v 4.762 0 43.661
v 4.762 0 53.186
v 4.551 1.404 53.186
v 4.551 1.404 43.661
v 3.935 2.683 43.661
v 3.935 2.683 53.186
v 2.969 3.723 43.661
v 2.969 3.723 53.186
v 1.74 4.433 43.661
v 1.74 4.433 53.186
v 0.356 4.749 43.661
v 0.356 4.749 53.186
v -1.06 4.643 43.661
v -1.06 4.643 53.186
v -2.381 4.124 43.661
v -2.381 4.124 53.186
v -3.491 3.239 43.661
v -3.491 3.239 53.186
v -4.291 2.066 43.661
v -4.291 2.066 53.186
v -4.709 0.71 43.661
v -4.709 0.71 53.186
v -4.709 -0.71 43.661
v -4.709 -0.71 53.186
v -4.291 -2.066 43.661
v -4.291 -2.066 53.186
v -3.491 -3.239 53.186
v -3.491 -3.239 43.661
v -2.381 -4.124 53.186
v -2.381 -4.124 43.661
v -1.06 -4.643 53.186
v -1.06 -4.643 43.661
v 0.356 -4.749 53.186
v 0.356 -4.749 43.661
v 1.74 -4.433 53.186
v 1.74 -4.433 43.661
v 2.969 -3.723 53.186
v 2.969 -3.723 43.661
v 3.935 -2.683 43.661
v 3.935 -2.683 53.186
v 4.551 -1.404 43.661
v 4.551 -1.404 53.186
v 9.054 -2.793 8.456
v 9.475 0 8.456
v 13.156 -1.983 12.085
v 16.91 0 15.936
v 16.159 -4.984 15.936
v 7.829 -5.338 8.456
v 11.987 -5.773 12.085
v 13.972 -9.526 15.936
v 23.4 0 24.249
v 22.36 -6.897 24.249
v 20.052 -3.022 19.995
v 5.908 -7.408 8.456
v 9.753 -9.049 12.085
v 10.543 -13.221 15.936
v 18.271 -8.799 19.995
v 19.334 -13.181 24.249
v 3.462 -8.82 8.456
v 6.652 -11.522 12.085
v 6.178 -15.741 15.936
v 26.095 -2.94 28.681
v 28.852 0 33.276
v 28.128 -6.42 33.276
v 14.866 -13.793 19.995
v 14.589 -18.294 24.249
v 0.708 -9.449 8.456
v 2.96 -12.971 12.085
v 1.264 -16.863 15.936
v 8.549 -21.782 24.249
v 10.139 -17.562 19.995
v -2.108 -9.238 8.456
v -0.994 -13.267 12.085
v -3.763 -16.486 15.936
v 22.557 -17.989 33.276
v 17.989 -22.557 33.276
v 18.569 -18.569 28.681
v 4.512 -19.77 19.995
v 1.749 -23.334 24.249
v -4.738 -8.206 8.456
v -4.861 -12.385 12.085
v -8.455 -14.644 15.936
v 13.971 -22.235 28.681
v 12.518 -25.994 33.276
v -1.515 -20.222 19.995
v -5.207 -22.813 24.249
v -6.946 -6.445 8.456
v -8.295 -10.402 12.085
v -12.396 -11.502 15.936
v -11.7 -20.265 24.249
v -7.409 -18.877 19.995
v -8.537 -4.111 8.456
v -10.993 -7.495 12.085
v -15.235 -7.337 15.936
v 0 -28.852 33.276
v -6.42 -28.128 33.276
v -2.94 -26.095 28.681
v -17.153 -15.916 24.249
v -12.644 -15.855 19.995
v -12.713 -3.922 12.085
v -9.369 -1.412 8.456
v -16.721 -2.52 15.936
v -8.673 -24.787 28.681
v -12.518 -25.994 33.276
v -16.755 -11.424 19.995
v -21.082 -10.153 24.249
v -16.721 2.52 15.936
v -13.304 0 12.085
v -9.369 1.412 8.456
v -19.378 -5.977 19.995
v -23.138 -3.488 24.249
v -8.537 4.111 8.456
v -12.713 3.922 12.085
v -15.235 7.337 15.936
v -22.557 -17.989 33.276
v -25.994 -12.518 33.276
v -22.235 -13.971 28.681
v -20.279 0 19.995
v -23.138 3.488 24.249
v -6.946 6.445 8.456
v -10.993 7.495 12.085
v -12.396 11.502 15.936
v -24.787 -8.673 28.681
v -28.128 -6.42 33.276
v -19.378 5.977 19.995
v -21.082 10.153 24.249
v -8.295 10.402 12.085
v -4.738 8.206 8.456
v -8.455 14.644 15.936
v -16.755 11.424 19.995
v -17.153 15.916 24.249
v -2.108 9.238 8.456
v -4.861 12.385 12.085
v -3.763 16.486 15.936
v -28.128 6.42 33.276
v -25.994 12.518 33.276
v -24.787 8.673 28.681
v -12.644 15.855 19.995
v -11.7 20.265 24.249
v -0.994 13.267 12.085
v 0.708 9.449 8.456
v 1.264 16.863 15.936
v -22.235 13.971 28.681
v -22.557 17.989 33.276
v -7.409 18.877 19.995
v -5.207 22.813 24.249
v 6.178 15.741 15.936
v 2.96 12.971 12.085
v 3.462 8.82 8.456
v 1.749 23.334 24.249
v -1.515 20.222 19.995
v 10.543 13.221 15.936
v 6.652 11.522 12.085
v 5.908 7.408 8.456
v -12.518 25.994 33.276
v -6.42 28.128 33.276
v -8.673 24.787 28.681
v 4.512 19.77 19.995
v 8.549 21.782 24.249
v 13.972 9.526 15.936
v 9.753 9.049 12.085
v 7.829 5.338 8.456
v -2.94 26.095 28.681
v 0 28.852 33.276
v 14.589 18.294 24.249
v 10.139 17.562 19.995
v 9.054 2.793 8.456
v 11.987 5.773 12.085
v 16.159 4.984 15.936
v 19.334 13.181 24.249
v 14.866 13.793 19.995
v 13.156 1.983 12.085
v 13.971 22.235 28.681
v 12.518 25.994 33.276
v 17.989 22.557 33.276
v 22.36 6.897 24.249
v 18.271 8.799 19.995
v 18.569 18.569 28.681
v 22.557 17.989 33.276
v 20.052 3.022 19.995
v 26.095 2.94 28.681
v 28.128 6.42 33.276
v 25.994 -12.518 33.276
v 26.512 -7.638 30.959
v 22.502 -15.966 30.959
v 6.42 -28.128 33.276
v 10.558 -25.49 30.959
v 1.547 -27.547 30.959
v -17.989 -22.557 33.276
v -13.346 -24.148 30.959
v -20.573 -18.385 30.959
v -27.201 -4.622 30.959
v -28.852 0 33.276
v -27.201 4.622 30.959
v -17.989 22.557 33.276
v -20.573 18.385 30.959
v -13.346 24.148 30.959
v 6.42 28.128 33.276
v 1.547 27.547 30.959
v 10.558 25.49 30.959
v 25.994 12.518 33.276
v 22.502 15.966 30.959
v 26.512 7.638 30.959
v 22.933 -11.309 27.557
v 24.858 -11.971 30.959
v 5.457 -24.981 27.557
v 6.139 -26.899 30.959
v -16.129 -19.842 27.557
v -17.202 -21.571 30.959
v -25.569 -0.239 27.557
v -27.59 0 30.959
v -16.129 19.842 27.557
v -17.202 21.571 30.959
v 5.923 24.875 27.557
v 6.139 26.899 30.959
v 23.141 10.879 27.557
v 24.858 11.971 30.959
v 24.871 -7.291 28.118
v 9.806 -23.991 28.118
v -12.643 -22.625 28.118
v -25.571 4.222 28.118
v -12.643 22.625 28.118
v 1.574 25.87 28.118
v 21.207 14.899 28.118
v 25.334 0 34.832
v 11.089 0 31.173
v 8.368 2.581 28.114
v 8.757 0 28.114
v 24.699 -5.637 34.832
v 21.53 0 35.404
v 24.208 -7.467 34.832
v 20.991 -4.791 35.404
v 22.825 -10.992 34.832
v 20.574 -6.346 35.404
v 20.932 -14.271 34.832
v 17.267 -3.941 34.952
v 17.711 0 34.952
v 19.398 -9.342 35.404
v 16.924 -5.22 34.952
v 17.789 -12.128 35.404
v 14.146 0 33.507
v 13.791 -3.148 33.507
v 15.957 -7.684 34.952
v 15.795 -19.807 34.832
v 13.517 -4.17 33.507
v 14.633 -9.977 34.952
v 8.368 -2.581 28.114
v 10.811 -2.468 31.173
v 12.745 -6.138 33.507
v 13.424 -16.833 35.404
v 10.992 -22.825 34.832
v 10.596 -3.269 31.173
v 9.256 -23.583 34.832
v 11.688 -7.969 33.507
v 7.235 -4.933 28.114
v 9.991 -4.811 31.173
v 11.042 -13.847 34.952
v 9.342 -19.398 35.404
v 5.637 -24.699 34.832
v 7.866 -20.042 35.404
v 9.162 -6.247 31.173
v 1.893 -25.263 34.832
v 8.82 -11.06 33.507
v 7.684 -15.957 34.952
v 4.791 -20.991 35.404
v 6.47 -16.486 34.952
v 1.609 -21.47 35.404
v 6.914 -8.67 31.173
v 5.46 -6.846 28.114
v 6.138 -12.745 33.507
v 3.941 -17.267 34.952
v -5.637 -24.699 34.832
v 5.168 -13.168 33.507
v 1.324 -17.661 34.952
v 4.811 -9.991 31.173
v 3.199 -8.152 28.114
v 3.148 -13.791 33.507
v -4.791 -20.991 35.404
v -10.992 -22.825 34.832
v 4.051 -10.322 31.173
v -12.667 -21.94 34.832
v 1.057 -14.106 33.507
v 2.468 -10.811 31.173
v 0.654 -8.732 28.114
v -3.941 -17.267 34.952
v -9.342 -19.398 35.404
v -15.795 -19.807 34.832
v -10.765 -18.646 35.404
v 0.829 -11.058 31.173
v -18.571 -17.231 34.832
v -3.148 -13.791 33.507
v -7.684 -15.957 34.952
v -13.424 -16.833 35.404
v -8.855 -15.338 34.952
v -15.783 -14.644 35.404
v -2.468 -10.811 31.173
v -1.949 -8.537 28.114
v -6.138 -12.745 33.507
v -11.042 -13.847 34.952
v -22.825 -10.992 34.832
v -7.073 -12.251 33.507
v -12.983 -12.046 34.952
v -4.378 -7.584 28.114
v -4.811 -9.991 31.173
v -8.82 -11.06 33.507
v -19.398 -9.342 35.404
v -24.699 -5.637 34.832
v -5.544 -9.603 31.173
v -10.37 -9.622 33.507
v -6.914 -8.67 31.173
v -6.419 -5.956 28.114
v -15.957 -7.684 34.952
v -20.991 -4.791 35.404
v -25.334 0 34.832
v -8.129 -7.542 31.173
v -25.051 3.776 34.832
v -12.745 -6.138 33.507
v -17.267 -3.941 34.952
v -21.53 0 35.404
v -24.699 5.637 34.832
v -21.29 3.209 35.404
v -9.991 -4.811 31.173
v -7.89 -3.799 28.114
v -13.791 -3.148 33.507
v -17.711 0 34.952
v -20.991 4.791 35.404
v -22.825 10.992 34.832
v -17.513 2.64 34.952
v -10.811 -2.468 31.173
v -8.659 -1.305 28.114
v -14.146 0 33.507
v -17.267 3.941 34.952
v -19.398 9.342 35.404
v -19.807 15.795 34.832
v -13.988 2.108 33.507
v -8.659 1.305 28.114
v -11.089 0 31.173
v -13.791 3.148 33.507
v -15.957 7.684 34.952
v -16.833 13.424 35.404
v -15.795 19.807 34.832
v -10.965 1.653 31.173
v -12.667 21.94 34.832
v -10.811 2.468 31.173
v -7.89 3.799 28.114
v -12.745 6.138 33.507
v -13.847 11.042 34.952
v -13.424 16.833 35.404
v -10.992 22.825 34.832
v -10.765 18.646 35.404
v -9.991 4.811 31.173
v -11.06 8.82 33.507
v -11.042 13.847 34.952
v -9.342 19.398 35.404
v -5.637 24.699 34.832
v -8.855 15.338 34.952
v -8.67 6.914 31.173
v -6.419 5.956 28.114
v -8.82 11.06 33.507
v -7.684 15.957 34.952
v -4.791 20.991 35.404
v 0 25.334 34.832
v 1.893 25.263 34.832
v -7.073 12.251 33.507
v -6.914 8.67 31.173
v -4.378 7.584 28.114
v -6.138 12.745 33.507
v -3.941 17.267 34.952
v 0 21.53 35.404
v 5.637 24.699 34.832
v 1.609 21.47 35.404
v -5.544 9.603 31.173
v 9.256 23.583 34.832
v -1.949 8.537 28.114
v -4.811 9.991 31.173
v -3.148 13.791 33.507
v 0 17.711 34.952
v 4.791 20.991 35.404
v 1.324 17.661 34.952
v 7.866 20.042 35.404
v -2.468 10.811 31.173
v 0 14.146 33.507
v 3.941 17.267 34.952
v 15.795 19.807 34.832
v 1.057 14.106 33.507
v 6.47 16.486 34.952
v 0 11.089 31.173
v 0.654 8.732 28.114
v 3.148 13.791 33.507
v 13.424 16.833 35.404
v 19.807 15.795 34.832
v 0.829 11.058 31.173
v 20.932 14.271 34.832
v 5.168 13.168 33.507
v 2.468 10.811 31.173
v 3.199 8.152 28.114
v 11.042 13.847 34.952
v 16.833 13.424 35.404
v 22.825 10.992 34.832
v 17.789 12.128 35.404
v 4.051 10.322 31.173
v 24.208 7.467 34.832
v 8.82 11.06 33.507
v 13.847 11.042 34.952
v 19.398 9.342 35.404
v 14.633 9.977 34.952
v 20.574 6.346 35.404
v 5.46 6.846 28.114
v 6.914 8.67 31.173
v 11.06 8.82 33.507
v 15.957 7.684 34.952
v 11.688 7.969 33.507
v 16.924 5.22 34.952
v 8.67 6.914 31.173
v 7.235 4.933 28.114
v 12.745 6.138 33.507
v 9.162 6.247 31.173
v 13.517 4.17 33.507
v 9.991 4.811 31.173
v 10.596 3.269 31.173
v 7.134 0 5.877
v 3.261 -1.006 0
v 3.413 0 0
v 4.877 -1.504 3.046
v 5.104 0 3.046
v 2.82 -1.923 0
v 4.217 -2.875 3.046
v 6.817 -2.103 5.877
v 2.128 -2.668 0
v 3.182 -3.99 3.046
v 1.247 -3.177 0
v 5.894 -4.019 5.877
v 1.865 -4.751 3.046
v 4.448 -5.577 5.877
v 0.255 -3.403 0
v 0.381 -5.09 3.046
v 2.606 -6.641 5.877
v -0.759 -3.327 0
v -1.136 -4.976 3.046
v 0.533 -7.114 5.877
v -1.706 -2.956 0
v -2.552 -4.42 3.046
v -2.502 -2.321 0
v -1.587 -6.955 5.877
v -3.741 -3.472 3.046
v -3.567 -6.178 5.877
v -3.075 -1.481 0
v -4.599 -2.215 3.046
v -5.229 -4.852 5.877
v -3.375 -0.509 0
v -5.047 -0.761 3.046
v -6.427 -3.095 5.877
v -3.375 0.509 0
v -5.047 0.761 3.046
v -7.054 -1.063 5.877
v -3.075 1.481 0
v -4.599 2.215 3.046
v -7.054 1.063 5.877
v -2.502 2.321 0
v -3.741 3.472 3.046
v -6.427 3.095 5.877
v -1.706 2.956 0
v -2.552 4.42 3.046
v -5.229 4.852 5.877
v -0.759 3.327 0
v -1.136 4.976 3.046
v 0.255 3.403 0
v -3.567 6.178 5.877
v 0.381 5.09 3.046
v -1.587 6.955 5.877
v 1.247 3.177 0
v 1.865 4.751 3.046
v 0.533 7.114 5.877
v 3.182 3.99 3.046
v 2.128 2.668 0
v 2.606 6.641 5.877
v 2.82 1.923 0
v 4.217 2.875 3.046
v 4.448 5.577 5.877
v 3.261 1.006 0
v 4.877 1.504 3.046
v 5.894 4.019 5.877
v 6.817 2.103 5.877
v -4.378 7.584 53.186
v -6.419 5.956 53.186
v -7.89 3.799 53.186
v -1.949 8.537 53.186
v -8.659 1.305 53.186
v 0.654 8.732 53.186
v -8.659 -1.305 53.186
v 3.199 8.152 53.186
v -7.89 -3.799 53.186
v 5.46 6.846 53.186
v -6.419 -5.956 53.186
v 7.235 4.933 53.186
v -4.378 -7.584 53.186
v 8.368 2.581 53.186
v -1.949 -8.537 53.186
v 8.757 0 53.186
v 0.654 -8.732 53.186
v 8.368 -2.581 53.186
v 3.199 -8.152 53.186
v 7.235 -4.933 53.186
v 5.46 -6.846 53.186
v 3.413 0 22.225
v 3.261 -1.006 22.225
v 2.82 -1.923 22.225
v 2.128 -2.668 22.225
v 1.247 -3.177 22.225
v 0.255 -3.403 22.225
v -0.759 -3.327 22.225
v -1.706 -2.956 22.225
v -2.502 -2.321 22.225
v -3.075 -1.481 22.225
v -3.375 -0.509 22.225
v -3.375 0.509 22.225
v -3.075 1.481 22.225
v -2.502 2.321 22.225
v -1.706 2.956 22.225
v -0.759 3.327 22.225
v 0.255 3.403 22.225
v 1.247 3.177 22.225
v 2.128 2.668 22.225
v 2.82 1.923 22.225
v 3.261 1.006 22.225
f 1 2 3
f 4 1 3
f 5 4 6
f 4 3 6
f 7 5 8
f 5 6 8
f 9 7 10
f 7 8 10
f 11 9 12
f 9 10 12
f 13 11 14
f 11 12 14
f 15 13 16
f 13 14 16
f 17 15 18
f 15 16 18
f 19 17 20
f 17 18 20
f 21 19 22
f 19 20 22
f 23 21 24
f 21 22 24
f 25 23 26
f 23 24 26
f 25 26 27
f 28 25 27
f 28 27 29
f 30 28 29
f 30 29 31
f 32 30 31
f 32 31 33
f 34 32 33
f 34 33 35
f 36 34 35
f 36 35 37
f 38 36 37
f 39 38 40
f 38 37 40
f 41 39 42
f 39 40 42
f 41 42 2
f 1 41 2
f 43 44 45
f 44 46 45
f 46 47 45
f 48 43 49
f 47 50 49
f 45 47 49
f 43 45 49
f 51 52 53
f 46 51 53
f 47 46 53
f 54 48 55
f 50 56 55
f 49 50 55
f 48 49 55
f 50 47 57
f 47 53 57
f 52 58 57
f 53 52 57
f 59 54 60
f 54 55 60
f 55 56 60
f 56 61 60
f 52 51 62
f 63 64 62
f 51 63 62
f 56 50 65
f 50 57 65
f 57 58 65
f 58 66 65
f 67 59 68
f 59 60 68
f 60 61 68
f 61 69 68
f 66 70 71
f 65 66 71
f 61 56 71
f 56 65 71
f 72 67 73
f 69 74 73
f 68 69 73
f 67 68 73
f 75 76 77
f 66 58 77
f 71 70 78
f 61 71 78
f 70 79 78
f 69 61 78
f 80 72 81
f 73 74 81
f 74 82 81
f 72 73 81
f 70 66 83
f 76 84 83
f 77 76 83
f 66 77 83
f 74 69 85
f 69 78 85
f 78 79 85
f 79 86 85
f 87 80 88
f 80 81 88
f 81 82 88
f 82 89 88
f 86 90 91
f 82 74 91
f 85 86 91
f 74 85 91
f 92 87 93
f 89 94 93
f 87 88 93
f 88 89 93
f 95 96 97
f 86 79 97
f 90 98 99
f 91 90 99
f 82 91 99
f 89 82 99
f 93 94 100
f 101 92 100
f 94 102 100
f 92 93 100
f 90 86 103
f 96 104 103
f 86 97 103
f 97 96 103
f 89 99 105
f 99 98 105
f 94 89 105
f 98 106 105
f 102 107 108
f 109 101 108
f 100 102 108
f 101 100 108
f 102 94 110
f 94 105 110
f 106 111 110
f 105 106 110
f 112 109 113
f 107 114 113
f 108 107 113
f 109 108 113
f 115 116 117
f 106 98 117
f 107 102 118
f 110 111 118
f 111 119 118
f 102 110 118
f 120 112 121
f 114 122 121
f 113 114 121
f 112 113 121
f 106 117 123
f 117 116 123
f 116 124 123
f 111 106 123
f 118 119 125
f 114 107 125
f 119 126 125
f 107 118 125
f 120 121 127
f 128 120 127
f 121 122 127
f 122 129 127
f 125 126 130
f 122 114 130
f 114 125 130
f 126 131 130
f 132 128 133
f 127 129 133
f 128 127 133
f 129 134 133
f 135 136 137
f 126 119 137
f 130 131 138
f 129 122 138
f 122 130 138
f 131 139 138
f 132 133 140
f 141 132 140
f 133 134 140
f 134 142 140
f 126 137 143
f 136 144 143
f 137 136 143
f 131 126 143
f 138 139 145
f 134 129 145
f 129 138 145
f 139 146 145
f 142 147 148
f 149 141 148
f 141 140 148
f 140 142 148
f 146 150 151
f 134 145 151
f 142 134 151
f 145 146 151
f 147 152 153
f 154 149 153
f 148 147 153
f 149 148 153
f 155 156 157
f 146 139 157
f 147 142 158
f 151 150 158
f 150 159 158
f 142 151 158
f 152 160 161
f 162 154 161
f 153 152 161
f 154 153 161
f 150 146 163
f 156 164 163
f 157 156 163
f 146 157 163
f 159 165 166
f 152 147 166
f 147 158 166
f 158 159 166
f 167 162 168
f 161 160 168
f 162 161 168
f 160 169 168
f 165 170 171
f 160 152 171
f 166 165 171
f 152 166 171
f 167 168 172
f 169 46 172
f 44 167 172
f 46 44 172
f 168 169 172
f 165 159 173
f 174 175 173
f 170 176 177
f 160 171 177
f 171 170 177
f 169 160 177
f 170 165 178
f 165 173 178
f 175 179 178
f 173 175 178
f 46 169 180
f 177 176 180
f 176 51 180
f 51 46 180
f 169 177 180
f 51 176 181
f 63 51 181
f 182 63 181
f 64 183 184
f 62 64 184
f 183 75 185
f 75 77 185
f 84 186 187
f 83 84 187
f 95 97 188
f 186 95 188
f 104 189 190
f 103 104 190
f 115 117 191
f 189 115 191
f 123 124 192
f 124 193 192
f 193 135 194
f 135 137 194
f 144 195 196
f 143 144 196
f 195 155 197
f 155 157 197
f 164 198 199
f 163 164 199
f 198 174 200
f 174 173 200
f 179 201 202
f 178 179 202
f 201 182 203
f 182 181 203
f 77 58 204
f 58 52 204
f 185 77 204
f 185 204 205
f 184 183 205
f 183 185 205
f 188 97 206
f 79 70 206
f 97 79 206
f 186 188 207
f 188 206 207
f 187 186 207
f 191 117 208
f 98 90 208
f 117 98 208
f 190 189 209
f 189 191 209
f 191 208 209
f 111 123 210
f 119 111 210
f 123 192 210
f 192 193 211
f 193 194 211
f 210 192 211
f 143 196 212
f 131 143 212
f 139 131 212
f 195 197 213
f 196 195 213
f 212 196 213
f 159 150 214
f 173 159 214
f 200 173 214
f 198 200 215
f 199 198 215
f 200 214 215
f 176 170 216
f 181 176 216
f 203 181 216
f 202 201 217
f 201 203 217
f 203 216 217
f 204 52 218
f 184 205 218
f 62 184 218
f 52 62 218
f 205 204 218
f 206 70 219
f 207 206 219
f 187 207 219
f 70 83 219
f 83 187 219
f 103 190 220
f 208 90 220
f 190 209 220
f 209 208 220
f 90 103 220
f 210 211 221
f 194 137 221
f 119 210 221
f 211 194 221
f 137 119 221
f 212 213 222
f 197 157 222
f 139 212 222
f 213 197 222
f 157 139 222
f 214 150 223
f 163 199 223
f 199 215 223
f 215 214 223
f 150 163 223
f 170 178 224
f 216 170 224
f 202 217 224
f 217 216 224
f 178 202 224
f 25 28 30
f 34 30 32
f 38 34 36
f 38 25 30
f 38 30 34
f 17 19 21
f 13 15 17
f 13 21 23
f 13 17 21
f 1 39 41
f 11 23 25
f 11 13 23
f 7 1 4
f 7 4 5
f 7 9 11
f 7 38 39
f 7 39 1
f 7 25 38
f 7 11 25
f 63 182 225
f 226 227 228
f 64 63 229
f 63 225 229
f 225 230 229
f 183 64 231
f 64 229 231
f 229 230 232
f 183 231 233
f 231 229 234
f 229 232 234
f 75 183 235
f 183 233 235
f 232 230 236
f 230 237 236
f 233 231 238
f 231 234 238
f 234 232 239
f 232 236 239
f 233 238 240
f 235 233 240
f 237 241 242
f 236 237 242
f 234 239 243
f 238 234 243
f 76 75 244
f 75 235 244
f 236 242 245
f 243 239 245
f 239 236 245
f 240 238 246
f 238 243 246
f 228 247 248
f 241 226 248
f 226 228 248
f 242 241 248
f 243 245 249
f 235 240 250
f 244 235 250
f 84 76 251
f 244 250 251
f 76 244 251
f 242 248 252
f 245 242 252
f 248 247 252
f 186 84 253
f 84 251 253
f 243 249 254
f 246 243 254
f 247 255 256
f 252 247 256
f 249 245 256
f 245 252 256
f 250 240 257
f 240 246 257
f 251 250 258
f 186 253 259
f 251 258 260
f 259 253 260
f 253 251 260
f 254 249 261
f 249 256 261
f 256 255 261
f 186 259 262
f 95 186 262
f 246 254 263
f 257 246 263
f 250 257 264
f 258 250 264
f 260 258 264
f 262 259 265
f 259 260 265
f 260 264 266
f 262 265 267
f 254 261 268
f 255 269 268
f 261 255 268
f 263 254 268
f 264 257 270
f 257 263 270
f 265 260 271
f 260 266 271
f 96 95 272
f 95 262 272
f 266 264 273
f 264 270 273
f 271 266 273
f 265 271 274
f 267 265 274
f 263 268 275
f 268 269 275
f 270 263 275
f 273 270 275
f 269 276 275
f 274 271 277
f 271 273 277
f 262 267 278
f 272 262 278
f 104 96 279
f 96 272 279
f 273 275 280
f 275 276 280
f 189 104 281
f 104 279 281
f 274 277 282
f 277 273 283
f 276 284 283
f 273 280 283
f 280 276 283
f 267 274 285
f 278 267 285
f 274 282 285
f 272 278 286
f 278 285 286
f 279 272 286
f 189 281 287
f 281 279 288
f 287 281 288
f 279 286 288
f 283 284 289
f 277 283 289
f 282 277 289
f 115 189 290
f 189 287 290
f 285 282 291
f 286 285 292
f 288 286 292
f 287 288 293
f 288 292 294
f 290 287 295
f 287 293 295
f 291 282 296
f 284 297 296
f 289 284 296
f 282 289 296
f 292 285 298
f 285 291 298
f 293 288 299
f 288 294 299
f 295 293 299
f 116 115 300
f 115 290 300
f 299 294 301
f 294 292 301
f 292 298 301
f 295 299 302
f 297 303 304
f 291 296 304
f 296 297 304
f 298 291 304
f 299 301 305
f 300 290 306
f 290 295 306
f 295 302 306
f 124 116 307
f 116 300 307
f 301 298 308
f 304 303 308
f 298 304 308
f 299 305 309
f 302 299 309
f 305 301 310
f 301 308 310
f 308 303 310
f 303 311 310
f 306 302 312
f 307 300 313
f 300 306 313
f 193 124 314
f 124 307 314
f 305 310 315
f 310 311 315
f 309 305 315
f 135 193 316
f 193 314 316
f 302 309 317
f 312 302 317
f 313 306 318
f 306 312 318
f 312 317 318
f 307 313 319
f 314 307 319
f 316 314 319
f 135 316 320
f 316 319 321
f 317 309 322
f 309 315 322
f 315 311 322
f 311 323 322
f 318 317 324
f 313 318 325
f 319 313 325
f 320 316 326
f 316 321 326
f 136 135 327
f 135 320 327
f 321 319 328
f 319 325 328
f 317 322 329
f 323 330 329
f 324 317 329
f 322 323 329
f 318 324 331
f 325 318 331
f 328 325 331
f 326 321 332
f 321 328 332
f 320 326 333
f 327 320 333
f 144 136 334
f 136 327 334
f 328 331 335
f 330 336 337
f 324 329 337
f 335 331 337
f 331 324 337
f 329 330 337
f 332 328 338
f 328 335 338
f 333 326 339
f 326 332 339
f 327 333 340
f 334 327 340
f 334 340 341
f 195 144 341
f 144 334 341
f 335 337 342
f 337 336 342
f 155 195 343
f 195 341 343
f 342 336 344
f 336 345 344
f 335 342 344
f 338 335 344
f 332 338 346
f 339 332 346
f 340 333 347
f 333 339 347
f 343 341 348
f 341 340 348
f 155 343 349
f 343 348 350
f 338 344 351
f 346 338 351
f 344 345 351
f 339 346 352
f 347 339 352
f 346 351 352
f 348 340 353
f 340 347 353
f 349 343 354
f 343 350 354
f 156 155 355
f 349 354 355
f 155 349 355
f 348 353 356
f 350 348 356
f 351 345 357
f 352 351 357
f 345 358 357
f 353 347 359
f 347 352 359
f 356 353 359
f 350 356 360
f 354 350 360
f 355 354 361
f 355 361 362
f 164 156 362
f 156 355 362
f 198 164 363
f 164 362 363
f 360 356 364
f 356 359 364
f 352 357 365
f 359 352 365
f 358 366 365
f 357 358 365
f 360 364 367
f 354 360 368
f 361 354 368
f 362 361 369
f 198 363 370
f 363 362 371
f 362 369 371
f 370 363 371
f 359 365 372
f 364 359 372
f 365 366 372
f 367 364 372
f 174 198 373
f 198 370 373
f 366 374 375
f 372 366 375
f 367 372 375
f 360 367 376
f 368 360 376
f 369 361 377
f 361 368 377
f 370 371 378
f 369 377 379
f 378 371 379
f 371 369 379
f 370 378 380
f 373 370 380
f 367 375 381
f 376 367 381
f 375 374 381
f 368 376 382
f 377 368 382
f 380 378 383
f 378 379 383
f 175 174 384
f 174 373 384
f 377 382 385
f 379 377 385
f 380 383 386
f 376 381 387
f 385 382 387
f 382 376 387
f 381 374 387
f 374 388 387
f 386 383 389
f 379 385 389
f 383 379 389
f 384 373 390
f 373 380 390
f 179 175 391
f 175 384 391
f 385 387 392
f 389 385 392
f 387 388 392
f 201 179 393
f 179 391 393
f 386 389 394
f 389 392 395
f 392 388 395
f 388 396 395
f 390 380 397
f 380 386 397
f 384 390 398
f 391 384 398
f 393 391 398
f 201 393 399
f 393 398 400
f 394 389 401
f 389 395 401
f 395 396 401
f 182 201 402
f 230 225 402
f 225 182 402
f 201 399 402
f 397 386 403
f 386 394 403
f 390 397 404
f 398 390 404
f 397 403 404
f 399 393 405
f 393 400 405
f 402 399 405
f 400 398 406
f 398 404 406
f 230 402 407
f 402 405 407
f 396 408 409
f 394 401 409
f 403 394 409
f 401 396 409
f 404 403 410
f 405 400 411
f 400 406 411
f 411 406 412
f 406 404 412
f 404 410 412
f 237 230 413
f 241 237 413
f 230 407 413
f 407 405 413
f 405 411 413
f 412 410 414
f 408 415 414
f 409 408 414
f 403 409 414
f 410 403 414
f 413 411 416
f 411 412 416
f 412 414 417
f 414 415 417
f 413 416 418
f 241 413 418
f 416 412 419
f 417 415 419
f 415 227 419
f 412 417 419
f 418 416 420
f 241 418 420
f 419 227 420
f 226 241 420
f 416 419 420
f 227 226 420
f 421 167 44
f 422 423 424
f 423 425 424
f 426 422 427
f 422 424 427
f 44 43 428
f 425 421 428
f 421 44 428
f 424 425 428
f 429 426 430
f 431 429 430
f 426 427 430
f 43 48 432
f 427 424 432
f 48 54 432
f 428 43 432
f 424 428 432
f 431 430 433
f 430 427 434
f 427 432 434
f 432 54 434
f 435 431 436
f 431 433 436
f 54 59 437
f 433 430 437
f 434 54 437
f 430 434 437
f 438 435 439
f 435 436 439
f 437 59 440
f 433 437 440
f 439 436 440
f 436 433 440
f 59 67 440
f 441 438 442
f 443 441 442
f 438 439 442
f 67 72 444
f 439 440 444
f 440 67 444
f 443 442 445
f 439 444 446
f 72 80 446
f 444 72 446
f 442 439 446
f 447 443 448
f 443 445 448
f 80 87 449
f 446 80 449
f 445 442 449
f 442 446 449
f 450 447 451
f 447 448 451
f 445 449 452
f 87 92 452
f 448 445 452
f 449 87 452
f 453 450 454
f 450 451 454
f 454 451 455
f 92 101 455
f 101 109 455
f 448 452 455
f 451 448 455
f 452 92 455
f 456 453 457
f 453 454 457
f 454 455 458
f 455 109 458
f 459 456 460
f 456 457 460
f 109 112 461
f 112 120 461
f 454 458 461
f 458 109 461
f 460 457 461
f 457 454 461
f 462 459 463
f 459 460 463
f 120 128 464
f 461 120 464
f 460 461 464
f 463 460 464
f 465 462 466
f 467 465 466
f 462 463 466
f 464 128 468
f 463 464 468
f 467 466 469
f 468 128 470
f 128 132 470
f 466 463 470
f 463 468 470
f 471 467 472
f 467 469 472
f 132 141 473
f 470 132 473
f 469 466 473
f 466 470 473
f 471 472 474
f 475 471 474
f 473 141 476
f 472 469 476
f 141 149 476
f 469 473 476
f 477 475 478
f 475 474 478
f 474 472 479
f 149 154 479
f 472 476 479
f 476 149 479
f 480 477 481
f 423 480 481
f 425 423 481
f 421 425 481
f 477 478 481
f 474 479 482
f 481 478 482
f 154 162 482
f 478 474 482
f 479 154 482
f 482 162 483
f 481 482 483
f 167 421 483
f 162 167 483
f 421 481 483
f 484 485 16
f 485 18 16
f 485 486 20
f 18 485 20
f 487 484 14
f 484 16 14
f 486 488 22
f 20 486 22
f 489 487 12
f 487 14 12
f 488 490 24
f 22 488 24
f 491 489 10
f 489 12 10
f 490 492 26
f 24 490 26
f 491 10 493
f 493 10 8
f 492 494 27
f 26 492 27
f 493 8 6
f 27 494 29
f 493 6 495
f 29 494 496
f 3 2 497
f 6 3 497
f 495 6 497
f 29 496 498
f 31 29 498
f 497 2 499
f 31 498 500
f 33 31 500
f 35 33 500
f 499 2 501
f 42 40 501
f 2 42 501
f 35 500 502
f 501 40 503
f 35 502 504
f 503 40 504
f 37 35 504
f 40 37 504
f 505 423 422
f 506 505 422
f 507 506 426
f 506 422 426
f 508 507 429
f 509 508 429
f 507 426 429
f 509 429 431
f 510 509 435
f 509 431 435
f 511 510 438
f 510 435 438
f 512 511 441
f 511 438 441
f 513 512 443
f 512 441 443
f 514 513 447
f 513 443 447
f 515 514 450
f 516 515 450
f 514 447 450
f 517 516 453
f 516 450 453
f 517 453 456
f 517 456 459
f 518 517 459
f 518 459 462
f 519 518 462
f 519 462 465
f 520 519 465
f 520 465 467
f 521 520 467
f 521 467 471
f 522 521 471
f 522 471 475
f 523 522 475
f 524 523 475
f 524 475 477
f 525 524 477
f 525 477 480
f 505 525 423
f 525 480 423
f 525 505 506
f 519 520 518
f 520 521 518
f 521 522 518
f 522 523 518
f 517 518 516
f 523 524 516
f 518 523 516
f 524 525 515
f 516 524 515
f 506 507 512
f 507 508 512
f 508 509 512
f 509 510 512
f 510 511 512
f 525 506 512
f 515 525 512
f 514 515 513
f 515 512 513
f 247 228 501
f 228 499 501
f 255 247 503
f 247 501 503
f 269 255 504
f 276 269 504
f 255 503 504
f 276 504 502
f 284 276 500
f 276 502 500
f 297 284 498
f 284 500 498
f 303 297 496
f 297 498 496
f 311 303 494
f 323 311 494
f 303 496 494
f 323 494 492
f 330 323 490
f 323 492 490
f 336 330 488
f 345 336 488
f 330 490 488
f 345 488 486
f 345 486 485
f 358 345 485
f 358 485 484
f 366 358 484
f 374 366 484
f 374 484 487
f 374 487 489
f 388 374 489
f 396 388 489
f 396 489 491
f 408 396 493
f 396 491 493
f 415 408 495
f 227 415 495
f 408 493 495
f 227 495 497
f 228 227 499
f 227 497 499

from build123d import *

# Parameters (mm, degrees)
F3_DEPTH = 22.225
F2_R     = 4.7625
F4_DEPTH = 9.525


with BuildPart() as f1:
    # F0 (on Front) → F1 (revolve)
    with BuildSketch(Plane.XZ):
        with BuildLine():
            ThreePointArc((3.412974067, 0), (6.0780676214, 4.490586962), (9.4752153529, 8.4563759387))
            ThreePointArc((9.4752153529, 8.4563759387), (20.2789307242, 19.9953148359), (28.8515333086, 33.2760475576))
            ThreePointArc((28.8515333086, 33.2760475576), (17.7106806745, 34.9519719001), (8.7568536401, 28.1141139567))
            Line((8.7568536401, 28.1141139567), (8.7568536401, 53.1863681972))
            Line((8.7568536401, 53.1863681972), (0, 53.1863681972))
            Line((0, 53.1863681972), (0, 0))
            Line((0, 0), (3.412974067, 0))
        make_face()
    revolve(axis=Axis((0, 0, 26.5931840986), (0, 0, -1)))

    # F3 (cut): a face of the model
    f3_faces = [f1.faces().sort_by_distance(p)[0] for p in [
        (0, 0, 0),
    ]]
    extrude(f3_faces, amount=-F3_DEPTH, mode=Mode.SUBTRACT)

    # F2 (on face) → F4 (cut)
    with BuildSketch(Plane.XY.offset(53.1863681972)):
        Circle(F2_R)
    extrude(amount=-F4_DEPTH, mode=Mode.SUBTRACT)


solid = f1.part
